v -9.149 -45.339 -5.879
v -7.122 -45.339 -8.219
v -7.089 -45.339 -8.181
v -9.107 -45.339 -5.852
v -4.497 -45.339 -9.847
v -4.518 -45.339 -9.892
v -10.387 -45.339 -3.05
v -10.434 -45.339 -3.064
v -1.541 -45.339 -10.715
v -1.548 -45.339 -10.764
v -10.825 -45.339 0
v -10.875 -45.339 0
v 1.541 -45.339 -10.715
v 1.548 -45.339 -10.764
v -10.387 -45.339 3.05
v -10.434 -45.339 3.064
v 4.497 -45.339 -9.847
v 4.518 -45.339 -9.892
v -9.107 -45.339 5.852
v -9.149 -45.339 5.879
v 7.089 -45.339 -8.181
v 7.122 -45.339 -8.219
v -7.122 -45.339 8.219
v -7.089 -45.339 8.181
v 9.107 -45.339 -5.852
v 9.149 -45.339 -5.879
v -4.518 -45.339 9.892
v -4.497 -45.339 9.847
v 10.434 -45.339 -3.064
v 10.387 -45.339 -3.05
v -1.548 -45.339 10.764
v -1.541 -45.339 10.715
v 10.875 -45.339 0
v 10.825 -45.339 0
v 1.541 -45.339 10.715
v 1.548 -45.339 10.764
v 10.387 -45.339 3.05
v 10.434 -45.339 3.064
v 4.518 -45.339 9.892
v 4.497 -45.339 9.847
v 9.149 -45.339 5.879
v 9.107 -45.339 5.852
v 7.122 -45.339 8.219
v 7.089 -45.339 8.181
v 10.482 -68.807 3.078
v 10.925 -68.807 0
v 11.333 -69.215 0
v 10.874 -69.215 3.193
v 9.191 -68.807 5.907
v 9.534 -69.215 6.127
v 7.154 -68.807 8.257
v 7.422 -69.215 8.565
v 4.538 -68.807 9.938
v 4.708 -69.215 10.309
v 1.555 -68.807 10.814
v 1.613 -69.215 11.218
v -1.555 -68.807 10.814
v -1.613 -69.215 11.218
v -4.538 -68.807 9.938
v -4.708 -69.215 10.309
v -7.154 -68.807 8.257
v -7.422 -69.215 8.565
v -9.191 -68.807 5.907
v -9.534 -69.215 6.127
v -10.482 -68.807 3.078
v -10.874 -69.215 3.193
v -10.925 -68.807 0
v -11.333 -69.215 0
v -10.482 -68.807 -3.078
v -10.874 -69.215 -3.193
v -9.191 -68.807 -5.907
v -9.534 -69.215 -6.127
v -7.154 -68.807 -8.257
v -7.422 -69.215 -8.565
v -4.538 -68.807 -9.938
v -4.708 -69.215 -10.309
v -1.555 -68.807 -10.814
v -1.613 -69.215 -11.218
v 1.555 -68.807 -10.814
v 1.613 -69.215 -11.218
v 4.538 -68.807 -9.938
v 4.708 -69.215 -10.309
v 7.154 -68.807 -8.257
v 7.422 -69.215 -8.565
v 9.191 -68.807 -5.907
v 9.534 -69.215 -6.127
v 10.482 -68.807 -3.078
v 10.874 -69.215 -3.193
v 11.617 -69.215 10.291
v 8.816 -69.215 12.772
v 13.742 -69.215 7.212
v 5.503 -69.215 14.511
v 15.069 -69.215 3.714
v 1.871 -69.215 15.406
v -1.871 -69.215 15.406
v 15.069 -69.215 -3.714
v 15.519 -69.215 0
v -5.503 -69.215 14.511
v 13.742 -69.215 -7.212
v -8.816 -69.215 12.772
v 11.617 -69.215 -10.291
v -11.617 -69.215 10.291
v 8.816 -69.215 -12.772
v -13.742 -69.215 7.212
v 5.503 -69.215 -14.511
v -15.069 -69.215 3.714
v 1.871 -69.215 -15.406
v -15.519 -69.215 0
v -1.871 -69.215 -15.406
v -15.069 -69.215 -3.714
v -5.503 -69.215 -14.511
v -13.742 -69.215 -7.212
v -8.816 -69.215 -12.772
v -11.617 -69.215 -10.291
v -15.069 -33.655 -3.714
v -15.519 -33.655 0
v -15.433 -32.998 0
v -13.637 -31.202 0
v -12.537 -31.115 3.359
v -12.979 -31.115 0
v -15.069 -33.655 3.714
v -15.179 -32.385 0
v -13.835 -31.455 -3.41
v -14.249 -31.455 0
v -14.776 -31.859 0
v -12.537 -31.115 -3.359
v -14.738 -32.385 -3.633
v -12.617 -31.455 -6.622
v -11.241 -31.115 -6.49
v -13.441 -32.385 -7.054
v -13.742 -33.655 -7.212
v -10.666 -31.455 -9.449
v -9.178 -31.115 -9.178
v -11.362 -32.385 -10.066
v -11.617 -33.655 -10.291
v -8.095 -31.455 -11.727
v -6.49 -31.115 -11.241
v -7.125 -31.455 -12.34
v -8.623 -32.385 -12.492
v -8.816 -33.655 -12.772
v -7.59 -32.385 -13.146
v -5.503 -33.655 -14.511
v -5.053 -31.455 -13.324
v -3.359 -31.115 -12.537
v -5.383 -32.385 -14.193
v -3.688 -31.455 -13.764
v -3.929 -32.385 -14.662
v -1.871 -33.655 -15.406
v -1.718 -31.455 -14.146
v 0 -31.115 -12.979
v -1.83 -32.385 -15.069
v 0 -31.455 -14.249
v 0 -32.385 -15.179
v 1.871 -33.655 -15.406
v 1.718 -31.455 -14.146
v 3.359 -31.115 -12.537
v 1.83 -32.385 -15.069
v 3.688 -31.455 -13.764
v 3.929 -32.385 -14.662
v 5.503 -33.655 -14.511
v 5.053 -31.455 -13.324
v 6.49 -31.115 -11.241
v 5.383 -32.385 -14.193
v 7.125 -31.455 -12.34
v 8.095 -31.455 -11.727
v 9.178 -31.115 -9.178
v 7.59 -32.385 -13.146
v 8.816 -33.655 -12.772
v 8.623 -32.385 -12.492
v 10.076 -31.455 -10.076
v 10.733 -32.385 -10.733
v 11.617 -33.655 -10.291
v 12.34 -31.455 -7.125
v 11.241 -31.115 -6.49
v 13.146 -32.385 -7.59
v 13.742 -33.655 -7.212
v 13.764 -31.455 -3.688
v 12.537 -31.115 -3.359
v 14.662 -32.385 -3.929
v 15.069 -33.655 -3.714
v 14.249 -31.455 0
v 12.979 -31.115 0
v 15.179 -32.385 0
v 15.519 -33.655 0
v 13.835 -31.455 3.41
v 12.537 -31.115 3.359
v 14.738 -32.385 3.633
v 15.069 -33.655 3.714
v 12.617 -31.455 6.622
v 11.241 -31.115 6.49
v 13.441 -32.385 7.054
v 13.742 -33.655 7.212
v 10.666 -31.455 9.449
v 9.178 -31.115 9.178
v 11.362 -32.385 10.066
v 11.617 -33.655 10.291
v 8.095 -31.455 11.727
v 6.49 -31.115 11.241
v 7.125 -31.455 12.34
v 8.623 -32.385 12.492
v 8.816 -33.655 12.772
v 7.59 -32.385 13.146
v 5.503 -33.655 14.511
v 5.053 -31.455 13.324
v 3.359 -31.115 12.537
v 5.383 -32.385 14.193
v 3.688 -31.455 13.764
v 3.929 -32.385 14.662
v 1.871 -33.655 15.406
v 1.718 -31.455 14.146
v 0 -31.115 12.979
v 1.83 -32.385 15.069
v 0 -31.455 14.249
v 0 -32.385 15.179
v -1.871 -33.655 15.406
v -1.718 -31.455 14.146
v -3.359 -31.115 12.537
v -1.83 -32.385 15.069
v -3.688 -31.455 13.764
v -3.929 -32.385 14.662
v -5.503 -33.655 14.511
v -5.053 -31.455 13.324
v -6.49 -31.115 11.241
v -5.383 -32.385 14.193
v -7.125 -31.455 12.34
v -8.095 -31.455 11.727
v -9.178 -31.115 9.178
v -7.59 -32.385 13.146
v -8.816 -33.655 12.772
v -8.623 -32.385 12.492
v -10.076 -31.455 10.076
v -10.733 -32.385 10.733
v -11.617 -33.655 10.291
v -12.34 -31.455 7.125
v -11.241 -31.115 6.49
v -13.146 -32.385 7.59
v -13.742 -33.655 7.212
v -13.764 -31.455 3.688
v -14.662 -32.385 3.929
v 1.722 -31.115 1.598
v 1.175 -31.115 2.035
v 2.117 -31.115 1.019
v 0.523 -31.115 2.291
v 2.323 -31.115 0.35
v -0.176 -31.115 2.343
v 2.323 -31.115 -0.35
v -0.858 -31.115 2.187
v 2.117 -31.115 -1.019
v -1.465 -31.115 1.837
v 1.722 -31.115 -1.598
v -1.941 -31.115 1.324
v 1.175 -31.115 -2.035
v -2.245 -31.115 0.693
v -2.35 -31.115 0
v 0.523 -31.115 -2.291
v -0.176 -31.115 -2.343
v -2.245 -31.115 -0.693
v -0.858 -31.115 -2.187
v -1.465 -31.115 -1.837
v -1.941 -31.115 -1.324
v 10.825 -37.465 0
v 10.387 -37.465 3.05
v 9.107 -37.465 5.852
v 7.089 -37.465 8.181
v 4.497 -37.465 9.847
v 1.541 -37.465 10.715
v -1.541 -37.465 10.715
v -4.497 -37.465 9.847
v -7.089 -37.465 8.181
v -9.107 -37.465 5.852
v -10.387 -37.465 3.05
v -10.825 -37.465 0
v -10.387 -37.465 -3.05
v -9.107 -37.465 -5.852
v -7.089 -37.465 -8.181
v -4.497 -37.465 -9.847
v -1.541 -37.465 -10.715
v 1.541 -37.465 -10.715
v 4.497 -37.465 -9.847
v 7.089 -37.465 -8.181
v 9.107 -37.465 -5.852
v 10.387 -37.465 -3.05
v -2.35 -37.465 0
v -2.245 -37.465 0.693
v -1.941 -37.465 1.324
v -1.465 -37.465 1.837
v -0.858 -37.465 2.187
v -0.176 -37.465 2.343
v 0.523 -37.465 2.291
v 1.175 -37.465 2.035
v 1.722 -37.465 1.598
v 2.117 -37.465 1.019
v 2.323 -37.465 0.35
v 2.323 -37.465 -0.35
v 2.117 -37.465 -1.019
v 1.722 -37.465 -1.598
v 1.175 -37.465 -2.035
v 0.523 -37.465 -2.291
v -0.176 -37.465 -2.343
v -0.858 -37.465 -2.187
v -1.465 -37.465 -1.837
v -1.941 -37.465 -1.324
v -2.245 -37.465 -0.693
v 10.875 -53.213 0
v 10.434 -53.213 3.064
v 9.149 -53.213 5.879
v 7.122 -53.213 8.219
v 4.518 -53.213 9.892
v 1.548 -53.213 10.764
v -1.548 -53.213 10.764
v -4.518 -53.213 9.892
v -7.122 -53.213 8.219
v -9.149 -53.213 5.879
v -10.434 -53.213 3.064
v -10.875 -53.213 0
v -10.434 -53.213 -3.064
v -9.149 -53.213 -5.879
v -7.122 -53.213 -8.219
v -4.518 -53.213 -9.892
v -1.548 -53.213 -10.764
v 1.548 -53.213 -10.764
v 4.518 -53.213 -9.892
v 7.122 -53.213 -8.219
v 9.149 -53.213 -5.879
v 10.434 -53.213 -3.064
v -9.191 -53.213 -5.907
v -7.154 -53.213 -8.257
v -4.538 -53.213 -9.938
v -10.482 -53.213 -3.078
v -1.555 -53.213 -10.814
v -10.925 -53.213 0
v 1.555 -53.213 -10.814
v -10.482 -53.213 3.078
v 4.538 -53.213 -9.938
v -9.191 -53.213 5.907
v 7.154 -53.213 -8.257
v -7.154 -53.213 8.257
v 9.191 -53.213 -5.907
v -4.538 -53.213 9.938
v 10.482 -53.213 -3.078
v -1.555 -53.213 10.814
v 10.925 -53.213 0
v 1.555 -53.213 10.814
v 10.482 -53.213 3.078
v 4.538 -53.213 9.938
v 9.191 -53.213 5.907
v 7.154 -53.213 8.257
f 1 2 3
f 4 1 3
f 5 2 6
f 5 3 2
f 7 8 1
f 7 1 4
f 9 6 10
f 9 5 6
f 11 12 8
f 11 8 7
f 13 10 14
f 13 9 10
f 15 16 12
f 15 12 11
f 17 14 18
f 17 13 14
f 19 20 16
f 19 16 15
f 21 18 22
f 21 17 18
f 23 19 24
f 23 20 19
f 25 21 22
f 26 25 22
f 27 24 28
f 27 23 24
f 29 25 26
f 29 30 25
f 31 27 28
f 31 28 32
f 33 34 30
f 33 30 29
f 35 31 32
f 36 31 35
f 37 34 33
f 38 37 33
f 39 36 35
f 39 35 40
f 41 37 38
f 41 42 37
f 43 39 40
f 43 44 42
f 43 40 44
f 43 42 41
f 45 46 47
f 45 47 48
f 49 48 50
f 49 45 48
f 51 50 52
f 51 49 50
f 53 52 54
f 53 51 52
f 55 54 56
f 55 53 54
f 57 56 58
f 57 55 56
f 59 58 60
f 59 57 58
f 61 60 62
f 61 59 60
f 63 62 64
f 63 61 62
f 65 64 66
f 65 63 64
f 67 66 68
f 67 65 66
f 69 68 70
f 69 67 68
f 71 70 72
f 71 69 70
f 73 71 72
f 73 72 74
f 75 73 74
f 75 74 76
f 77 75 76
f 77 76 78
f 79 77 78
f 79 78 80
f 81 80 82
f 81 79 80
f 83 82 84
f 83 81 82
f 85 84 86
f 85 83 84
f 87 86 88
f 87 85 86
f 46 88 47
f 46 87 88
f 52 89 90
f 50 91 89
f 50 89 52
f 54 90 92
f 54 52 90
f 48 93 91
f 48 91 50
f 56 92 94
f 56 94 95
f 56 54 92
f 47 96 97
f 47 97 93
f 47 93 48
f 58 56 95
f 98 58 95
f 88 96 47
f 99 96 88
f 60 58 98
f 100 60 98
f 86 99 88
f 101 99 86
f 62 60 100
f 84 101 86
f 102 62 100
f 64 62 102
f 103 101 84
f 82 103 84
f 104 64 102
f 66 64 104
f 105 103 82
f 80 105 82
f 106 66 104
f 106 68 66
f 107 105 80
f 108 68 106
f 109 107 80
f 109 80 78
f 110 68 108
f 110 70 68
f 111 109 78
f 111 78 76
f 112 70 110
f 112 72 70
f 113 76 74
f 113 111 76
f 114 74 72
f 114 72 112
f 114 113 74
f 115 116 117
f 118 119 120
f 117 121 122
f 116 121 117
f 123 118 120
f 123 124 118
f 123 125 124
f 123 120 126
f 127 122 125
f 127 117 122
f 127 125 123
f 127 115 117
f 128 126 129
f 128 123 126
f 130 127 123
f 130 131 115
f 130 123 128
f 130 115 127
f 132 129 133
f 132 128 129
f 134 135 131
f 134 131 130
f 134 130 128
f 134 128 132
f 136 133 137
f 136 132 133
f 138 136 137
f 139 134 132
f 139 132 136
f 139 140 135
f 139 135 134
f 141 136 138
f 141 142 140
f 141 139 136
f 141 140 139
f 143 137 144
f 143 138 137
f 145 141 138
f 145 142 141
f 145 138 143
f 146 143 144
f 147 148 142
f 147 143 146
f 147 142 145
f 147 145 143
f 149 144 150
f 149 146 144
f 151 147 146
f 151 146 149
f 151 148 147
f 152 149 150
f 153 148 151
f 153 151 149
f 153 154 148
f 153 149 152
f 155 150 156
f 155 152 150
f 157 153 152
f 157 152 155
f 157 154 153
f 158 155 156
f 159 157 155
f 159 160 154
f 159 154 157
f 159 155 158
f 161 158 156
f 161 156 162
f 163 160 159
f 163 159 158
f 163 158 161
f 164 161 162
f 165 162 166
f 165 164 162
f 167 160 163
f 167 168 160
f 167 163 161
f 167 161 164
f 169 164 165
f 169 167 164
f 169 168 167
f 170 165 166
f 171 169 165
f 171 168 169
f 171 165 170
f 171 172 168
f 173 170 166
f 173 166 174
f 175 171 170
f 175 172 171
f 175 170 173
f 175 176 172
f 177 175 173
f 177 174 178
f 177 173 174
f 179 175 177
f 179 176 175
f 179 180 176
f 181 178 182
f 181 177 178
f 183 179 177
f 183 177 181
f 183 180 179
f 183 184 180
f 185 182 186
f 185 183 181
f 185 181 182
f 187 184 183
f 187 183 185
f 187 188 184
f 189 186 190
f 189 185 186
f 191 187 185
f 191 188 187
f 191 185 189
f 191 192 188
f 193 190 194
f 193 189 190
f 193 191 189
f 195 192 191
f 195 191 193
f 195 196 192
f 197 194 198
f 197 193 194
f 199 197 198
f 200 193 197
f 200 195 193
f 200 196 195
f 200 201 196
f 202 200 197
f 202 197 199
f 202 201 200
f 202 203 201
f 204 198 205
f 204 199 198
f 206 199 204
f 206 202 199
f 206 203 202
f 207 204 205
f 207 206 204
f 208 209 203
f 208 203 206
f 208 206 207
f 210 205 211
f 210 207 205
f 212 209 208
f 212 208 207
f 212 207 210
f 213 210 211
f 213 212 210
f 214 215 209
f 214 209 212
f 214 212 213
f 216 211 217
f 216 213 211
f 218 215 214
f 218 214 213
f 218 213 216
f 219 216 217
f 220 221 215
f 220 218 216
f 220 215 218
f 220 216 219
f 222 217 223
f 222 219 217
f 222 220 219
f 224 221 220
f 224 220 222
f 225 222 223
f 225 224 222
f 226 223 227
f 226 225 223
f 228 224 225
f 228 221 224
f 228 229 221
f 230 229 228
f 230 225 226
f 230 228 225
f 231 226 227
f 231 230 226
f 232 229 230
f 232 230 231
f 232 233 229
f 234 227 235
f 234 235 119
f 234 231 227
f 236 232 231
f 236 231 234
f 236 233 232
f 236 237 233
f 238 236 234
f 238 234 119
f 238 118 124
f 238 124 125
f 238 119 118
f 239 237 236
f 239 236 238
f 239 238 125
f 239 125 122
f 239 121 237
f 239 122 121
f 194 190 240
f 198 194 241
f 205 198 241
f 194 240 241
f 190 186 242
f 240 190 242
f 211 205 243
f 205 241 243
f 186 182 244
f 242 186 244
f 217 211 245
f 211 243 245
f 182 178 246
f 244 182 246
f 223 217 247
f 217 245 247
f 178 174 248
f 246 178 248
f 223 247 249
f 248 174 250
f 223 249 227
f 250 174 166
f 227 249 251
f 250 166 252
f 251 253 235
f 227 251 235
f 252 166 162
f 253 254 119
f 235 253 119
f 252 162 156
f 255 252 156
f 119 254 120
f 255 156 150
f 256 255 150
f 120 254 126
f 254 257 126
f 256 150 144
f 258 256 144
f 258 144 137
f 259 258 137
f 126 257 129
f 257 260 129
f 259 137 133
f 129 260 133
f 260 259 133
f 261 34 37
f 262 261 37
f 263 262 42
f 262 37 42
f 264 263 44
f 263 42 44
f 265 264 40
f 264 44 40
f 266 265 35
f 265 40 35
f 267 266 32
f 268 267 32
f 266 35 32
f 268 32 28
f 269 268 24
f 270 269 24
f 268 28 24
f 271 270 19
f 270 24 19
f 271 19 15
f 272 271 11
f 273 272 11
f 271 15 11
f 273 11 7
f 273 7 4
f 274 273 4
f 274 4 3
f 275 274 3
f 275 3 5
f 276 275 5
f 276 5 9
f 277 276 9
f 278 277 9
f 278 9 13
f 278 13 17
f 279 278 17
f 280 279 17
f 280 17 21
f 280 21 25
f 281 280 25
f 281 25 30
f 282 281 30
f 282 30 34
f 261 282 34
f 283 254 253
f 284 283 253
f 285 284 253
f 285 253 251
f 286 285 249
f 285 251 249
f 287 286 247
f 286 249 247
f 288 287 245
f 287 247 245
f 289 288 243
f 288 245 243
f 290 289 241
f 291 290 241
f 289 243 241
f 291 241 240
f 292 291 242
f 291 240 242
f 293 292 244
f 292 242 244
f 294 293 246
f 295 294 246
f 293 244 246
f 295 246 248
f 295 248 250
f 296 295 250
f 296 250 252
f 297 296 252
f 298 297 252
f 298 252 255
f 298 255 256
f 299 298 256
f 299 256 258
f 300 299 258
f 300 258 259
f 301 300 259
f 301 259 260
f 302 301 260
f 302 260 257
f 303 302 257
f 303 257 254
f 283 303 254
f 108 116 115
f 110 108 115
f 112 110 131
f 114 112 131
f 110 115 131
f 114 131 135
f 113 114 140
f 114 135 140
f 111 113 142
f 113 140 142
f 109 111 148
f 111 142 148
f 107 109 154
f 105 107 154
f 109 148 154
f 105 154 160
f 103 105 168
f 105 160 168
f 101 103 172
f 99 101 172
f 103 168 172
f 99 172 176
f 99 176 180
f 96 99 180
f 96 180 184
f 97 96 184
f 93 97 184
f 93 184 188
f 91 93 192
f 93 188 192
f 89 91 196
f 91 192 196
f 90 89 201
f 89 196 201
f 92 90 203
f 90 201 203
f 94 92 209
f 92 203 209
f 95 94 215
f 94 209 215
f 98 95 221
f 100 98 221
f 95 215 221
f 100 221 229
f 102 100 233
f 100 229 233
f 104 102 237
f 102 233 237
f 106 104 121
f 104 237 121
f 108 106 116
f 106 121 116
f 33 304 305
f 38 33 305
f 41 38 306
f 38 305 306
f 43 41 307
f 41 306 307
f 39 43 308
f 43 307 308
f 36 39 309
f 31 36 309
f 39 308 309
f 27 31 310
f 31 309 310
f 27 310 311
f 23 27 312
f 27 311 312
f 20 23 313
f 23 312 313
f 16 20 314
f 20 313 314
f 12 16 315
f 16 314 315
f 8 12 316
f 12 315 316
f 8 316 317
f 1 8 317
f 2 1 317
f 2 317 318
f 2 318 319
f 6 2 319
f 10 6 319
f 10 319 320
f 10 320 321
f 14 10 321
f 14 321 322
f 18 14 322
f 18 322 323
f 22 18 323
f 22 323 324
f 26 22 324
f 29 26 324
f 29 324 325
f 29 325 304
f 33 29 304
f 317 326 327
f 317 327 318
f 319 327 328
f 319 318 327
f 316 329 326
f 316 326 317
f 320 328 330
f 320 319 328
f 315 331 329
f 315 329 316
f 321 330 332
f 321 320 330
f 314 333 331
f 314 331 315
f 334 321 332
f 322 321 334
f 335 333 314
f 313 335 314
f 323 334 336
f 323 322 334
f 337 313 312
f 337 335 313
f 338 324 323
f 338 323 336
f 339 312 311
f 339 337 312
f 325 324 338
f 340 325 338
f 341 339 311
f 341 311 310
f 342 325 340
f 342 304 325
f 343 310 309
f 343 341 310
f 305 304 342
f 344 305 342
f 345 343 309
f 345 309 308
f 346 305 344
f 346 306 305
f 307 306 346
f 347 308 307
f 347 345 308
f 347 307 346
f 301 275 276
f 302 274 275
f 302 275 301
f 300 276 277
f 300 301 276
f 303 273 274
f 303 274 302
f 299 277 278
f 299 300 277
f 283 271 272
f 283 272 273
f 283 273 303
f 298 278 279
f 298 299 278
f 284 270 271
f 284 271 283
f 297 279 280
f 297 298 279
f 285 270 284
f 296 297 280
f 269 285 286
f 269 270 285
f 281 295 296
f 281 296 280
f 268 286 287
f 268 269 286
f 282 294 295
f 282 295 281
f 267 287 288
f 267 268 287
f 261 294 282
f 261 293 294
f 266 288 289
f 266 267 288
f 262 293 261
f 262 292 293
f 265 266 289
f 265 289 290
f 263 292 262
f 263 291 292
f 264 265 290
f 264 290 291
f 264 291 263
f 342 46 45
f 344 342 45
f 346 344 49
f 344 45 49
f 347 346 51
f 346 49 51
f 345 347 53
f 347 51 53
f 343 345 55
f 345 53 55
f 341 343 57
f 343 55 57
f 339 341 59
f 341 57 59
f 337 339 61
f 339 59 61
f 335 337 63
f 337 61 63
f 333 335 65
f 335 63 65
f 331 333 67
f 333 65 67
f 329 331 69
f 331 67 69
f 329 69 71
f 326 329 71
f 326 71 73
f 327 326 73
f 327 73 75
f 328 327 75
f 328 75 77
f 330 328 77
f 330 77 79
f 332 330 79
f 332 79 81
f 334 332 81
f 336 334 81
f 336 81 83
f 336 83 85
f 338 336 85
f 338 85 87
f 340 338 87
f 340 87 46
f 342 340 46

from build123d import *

# Parameters (mm, degrees)
BOSS_EXTRUDE1_DEPTH      = 8.509
BOSS_EXTRUDE1_DEPTH_BACK = 8.509
SKETCH3_R                = 15.519490552
BOSS_EXTRUDE2_DEPTH      = 38.1
SKETCH4_R                = 10.825000036
CUT_EXTRUDE1_DEPTH       = 31.75
CUT_EXTRUDE2_DEPTH       = 73.611468784
CUT_EXTRUDE2_DEPTH_BACK  = 73.611468784
SKETCH5_W                = 9.906
SKETCH5_H                = 56.435801088
SKETCH6_R                = 5.08
CUT_EXTRUDE3_DEPTH       = 75.892851262
CHAMFER1_SIZE            = 0.254
CHAMFER2_SIZE            = 0.508
FILLET1_R                = 1.27
FILLET2_R                = 1.27
SKETCH11_R               = 15.519490552
CUT_EXTRUDE4_DEPTH       = 45.520887291
FILLET4_R                = 2.54
SKETCH12_R               = 2.3495
CUT_EXTRUDE5_DEPTH       = 44.969525515
CUT_EXTRUDE6_START       = 31.75
SKETCH13_R               = 10.875012636
CUT_EXTRUDE6_DEPTH       = 23.876
CUT_EXTRUDE7_START       = 23.876
SKETCH14_R               = 10.925012636
CUT_EXTRUDE7_DEPTH       = 16.002


with BuildPart() as part:
    # Sketch2 → Boss-Extrude1 (new, two sides: drawn at the far end of the back side and taken through both)
    with BuildSketch(Plane.XY.offset(-BOSS_EXTRUDE1_DEPTH_BACK)):
        with BuildLine():
            Line((11.43, -31.115), (7.565118148, 0.912900544))
            ThreePointArc((7.565118148, 0.912900544), (0, 7.62), (-7.565118148, 0.912900544))
            Line((-7.565118148, 0.912900544), (-11.43, -31.115))
            Line((-11.43, -31.115), (11.43, -31.115))
        make_face()
    extrude(amount=BOSS_EXTRUDE1_DEPTH + BOSS_EXTRUDE1_DEPTH_BACK)

    # Sketch3 → Boss-Extrude2 (add)
    with BuildSketch(Plane.XZ.offset(31.115)):
        with Locations(Location((0, 0, 0), (0, 0, 180))):
            Circle(SKETCH3_R)
    extrude(amount=BOSS_EXTRUDE2_DEPTH)

    # Sketch4 → Cut-Extrude1 (cut)
    with BuildSketch(Plane.XZ.offset(69.215)):
        Circle(SKETCH4_R)
    extrude(amount=-CUT_EXTRUDE1_DEPTH, mode=Mode.SUBTRACT)

    # Sketch5 → Cut-Extrude2 (cut, two sides: drawn at the far end of the back side and taken through both)
    with BuildSketch(Plane(origin=(0, 0, 0), x_dir=(0, 0, -1), z_dir=(1, 0, 0)).offset(-CUT_EXTRUDE2_DEPTH_BACK)):
        with Locations((0, 0.912900544)):
            Rectangle(SKETCH5_W, SKETCH5_H)
    extrude(amount=CUT_EXTRUDE2_DEPTH + CUT_EXTRUDE2_DEPTH_BACK, mode=Mode.SUBTRACT)

    # Sketch6 → Cut-Extrude3 (cut, through all)
    with BuildSketch(Plane(origin=(0, 0, -8.509), x_dir=(-1, 0, 0), z_dir=(0, 0, -1))):
        with Locations(Location((0, 0, 0), (0, 0, 180))):
            Circle(SKETCH6_R)
    extrude(amount=-CUT_EXTRUDE3_DEPTH, mode=Mode.SUBTRACT)

    # Chamfer1
    chamfer1_edges = [part.edges().sort_by_distance(p)[0] for p in [
        (-5.08, 0, 8.509),
        (-5.08, 0, -4.953),
        (-5.08, 0, 4.953),
        (-5.08, 0, -8.509),
    ]]
    chamfer(chamfer1_edges, length=CHAMFER1_SIZE)

    # Chamfer2
    chamfer2_edges = [part.edges().sort_by_distance(p)[0] for p in [
        (-10.825000036, -69.215, 0),
    ]]
    chamfer(chamfer2_edges, length=CHAMFER2_SIZE)

    # Fillet1
    fillet1_edges = [part.edges().sort_by_distance(p)[0] for p in [
        (-9.497559074, -15.101049728, -8.509),
        (9.497559074, -15.101049728, -8.509),
        (0, 7.62, -8.509),
        (-9.497559074, -15.101049728, 8.509),
        (9.497559074, -15.101049728, 8.509),
        (0, 7.62, 8.509),
    ]]
    fillet(fillet1_edges, radius=FILLET1_R)

    # Fillet2
    fillet2_edges = [part.edges().sort_by_distance(p)[0] for p in [
        (11.43, -31.115, 0),
        (-11.43, -31.115, 0),
        (11.053691049, -31.115, -8.138646936),
        (11.053691049, -31.115, 8.138646936),
        (-11.053691049, -31.115, -8.138646936),
        (-11.053691049, -31.115, 8.138646936),
        (0, -31.115, -8.509),
        (0, -31.115, 8.509),
    ]]
    fillet(fillet2_edges, radius=FILLET2_R)

    # Sketch11 → Cut-Extrude4 (cut, through all)
    with BuildSketch(Plane(origin=(0, -31.115, 0), x_dir=(1, 0, 0), z_dir=(0, 1, 0))):
        with Locations(Location((0, 0, 0), (0, 0, 180))):
            Circle(SKETCH11_R)
    extrude(amount=CUT_EXTRUDE4_DEPTH, mode=Mode.SUBTRACT)

    # Fillet4
    fillet4_edges = [part.edges().sort_by_distance(p)[0] for p in [
        (15.519490552, -31.115, 0),
    ]]
    fillet(fillet4_edges, radius=FILLET4_R)

    # Sketch12 → Cut-Extrude5 (cut, through all)
    with BuildSketch(Plane(origin=(0, -31.115, 0), x_dir=(1, 0, 0), z_dir=(0, 1, 0))):
        with Locations(Location((0, 0, 0), (0, 0, 180))):
            Circle(SKETCH12_R)
    extrude(amount=-CUT_EXTRUDE5_DEPTH, mode=Mode.SUBTRACT)

    # Sketch13 → Cut-Extrude6 (cut)
    with BuildSketch(Plane.XZ.offset(37.465).offset(CUT_EXTRUDE6_START)):
        Circle(SKETCH13_R)
    extrude(amount=-CUT_EXTRUDE6_DEPTH, mode=Mode.SUBTRACT)

    # Sketch14 → Cut-Extrude7 (cut)
    with BuildSketch(Plane.XZ.offset(45.339).offset(CUT_EXTRUDE7_START)):
        Circle(SKETCH14_R)
    extrude(amount=-CUT_EXTRUDE7_DEPTH, mode=Mode.SUBTRACT)


solid = part.part
